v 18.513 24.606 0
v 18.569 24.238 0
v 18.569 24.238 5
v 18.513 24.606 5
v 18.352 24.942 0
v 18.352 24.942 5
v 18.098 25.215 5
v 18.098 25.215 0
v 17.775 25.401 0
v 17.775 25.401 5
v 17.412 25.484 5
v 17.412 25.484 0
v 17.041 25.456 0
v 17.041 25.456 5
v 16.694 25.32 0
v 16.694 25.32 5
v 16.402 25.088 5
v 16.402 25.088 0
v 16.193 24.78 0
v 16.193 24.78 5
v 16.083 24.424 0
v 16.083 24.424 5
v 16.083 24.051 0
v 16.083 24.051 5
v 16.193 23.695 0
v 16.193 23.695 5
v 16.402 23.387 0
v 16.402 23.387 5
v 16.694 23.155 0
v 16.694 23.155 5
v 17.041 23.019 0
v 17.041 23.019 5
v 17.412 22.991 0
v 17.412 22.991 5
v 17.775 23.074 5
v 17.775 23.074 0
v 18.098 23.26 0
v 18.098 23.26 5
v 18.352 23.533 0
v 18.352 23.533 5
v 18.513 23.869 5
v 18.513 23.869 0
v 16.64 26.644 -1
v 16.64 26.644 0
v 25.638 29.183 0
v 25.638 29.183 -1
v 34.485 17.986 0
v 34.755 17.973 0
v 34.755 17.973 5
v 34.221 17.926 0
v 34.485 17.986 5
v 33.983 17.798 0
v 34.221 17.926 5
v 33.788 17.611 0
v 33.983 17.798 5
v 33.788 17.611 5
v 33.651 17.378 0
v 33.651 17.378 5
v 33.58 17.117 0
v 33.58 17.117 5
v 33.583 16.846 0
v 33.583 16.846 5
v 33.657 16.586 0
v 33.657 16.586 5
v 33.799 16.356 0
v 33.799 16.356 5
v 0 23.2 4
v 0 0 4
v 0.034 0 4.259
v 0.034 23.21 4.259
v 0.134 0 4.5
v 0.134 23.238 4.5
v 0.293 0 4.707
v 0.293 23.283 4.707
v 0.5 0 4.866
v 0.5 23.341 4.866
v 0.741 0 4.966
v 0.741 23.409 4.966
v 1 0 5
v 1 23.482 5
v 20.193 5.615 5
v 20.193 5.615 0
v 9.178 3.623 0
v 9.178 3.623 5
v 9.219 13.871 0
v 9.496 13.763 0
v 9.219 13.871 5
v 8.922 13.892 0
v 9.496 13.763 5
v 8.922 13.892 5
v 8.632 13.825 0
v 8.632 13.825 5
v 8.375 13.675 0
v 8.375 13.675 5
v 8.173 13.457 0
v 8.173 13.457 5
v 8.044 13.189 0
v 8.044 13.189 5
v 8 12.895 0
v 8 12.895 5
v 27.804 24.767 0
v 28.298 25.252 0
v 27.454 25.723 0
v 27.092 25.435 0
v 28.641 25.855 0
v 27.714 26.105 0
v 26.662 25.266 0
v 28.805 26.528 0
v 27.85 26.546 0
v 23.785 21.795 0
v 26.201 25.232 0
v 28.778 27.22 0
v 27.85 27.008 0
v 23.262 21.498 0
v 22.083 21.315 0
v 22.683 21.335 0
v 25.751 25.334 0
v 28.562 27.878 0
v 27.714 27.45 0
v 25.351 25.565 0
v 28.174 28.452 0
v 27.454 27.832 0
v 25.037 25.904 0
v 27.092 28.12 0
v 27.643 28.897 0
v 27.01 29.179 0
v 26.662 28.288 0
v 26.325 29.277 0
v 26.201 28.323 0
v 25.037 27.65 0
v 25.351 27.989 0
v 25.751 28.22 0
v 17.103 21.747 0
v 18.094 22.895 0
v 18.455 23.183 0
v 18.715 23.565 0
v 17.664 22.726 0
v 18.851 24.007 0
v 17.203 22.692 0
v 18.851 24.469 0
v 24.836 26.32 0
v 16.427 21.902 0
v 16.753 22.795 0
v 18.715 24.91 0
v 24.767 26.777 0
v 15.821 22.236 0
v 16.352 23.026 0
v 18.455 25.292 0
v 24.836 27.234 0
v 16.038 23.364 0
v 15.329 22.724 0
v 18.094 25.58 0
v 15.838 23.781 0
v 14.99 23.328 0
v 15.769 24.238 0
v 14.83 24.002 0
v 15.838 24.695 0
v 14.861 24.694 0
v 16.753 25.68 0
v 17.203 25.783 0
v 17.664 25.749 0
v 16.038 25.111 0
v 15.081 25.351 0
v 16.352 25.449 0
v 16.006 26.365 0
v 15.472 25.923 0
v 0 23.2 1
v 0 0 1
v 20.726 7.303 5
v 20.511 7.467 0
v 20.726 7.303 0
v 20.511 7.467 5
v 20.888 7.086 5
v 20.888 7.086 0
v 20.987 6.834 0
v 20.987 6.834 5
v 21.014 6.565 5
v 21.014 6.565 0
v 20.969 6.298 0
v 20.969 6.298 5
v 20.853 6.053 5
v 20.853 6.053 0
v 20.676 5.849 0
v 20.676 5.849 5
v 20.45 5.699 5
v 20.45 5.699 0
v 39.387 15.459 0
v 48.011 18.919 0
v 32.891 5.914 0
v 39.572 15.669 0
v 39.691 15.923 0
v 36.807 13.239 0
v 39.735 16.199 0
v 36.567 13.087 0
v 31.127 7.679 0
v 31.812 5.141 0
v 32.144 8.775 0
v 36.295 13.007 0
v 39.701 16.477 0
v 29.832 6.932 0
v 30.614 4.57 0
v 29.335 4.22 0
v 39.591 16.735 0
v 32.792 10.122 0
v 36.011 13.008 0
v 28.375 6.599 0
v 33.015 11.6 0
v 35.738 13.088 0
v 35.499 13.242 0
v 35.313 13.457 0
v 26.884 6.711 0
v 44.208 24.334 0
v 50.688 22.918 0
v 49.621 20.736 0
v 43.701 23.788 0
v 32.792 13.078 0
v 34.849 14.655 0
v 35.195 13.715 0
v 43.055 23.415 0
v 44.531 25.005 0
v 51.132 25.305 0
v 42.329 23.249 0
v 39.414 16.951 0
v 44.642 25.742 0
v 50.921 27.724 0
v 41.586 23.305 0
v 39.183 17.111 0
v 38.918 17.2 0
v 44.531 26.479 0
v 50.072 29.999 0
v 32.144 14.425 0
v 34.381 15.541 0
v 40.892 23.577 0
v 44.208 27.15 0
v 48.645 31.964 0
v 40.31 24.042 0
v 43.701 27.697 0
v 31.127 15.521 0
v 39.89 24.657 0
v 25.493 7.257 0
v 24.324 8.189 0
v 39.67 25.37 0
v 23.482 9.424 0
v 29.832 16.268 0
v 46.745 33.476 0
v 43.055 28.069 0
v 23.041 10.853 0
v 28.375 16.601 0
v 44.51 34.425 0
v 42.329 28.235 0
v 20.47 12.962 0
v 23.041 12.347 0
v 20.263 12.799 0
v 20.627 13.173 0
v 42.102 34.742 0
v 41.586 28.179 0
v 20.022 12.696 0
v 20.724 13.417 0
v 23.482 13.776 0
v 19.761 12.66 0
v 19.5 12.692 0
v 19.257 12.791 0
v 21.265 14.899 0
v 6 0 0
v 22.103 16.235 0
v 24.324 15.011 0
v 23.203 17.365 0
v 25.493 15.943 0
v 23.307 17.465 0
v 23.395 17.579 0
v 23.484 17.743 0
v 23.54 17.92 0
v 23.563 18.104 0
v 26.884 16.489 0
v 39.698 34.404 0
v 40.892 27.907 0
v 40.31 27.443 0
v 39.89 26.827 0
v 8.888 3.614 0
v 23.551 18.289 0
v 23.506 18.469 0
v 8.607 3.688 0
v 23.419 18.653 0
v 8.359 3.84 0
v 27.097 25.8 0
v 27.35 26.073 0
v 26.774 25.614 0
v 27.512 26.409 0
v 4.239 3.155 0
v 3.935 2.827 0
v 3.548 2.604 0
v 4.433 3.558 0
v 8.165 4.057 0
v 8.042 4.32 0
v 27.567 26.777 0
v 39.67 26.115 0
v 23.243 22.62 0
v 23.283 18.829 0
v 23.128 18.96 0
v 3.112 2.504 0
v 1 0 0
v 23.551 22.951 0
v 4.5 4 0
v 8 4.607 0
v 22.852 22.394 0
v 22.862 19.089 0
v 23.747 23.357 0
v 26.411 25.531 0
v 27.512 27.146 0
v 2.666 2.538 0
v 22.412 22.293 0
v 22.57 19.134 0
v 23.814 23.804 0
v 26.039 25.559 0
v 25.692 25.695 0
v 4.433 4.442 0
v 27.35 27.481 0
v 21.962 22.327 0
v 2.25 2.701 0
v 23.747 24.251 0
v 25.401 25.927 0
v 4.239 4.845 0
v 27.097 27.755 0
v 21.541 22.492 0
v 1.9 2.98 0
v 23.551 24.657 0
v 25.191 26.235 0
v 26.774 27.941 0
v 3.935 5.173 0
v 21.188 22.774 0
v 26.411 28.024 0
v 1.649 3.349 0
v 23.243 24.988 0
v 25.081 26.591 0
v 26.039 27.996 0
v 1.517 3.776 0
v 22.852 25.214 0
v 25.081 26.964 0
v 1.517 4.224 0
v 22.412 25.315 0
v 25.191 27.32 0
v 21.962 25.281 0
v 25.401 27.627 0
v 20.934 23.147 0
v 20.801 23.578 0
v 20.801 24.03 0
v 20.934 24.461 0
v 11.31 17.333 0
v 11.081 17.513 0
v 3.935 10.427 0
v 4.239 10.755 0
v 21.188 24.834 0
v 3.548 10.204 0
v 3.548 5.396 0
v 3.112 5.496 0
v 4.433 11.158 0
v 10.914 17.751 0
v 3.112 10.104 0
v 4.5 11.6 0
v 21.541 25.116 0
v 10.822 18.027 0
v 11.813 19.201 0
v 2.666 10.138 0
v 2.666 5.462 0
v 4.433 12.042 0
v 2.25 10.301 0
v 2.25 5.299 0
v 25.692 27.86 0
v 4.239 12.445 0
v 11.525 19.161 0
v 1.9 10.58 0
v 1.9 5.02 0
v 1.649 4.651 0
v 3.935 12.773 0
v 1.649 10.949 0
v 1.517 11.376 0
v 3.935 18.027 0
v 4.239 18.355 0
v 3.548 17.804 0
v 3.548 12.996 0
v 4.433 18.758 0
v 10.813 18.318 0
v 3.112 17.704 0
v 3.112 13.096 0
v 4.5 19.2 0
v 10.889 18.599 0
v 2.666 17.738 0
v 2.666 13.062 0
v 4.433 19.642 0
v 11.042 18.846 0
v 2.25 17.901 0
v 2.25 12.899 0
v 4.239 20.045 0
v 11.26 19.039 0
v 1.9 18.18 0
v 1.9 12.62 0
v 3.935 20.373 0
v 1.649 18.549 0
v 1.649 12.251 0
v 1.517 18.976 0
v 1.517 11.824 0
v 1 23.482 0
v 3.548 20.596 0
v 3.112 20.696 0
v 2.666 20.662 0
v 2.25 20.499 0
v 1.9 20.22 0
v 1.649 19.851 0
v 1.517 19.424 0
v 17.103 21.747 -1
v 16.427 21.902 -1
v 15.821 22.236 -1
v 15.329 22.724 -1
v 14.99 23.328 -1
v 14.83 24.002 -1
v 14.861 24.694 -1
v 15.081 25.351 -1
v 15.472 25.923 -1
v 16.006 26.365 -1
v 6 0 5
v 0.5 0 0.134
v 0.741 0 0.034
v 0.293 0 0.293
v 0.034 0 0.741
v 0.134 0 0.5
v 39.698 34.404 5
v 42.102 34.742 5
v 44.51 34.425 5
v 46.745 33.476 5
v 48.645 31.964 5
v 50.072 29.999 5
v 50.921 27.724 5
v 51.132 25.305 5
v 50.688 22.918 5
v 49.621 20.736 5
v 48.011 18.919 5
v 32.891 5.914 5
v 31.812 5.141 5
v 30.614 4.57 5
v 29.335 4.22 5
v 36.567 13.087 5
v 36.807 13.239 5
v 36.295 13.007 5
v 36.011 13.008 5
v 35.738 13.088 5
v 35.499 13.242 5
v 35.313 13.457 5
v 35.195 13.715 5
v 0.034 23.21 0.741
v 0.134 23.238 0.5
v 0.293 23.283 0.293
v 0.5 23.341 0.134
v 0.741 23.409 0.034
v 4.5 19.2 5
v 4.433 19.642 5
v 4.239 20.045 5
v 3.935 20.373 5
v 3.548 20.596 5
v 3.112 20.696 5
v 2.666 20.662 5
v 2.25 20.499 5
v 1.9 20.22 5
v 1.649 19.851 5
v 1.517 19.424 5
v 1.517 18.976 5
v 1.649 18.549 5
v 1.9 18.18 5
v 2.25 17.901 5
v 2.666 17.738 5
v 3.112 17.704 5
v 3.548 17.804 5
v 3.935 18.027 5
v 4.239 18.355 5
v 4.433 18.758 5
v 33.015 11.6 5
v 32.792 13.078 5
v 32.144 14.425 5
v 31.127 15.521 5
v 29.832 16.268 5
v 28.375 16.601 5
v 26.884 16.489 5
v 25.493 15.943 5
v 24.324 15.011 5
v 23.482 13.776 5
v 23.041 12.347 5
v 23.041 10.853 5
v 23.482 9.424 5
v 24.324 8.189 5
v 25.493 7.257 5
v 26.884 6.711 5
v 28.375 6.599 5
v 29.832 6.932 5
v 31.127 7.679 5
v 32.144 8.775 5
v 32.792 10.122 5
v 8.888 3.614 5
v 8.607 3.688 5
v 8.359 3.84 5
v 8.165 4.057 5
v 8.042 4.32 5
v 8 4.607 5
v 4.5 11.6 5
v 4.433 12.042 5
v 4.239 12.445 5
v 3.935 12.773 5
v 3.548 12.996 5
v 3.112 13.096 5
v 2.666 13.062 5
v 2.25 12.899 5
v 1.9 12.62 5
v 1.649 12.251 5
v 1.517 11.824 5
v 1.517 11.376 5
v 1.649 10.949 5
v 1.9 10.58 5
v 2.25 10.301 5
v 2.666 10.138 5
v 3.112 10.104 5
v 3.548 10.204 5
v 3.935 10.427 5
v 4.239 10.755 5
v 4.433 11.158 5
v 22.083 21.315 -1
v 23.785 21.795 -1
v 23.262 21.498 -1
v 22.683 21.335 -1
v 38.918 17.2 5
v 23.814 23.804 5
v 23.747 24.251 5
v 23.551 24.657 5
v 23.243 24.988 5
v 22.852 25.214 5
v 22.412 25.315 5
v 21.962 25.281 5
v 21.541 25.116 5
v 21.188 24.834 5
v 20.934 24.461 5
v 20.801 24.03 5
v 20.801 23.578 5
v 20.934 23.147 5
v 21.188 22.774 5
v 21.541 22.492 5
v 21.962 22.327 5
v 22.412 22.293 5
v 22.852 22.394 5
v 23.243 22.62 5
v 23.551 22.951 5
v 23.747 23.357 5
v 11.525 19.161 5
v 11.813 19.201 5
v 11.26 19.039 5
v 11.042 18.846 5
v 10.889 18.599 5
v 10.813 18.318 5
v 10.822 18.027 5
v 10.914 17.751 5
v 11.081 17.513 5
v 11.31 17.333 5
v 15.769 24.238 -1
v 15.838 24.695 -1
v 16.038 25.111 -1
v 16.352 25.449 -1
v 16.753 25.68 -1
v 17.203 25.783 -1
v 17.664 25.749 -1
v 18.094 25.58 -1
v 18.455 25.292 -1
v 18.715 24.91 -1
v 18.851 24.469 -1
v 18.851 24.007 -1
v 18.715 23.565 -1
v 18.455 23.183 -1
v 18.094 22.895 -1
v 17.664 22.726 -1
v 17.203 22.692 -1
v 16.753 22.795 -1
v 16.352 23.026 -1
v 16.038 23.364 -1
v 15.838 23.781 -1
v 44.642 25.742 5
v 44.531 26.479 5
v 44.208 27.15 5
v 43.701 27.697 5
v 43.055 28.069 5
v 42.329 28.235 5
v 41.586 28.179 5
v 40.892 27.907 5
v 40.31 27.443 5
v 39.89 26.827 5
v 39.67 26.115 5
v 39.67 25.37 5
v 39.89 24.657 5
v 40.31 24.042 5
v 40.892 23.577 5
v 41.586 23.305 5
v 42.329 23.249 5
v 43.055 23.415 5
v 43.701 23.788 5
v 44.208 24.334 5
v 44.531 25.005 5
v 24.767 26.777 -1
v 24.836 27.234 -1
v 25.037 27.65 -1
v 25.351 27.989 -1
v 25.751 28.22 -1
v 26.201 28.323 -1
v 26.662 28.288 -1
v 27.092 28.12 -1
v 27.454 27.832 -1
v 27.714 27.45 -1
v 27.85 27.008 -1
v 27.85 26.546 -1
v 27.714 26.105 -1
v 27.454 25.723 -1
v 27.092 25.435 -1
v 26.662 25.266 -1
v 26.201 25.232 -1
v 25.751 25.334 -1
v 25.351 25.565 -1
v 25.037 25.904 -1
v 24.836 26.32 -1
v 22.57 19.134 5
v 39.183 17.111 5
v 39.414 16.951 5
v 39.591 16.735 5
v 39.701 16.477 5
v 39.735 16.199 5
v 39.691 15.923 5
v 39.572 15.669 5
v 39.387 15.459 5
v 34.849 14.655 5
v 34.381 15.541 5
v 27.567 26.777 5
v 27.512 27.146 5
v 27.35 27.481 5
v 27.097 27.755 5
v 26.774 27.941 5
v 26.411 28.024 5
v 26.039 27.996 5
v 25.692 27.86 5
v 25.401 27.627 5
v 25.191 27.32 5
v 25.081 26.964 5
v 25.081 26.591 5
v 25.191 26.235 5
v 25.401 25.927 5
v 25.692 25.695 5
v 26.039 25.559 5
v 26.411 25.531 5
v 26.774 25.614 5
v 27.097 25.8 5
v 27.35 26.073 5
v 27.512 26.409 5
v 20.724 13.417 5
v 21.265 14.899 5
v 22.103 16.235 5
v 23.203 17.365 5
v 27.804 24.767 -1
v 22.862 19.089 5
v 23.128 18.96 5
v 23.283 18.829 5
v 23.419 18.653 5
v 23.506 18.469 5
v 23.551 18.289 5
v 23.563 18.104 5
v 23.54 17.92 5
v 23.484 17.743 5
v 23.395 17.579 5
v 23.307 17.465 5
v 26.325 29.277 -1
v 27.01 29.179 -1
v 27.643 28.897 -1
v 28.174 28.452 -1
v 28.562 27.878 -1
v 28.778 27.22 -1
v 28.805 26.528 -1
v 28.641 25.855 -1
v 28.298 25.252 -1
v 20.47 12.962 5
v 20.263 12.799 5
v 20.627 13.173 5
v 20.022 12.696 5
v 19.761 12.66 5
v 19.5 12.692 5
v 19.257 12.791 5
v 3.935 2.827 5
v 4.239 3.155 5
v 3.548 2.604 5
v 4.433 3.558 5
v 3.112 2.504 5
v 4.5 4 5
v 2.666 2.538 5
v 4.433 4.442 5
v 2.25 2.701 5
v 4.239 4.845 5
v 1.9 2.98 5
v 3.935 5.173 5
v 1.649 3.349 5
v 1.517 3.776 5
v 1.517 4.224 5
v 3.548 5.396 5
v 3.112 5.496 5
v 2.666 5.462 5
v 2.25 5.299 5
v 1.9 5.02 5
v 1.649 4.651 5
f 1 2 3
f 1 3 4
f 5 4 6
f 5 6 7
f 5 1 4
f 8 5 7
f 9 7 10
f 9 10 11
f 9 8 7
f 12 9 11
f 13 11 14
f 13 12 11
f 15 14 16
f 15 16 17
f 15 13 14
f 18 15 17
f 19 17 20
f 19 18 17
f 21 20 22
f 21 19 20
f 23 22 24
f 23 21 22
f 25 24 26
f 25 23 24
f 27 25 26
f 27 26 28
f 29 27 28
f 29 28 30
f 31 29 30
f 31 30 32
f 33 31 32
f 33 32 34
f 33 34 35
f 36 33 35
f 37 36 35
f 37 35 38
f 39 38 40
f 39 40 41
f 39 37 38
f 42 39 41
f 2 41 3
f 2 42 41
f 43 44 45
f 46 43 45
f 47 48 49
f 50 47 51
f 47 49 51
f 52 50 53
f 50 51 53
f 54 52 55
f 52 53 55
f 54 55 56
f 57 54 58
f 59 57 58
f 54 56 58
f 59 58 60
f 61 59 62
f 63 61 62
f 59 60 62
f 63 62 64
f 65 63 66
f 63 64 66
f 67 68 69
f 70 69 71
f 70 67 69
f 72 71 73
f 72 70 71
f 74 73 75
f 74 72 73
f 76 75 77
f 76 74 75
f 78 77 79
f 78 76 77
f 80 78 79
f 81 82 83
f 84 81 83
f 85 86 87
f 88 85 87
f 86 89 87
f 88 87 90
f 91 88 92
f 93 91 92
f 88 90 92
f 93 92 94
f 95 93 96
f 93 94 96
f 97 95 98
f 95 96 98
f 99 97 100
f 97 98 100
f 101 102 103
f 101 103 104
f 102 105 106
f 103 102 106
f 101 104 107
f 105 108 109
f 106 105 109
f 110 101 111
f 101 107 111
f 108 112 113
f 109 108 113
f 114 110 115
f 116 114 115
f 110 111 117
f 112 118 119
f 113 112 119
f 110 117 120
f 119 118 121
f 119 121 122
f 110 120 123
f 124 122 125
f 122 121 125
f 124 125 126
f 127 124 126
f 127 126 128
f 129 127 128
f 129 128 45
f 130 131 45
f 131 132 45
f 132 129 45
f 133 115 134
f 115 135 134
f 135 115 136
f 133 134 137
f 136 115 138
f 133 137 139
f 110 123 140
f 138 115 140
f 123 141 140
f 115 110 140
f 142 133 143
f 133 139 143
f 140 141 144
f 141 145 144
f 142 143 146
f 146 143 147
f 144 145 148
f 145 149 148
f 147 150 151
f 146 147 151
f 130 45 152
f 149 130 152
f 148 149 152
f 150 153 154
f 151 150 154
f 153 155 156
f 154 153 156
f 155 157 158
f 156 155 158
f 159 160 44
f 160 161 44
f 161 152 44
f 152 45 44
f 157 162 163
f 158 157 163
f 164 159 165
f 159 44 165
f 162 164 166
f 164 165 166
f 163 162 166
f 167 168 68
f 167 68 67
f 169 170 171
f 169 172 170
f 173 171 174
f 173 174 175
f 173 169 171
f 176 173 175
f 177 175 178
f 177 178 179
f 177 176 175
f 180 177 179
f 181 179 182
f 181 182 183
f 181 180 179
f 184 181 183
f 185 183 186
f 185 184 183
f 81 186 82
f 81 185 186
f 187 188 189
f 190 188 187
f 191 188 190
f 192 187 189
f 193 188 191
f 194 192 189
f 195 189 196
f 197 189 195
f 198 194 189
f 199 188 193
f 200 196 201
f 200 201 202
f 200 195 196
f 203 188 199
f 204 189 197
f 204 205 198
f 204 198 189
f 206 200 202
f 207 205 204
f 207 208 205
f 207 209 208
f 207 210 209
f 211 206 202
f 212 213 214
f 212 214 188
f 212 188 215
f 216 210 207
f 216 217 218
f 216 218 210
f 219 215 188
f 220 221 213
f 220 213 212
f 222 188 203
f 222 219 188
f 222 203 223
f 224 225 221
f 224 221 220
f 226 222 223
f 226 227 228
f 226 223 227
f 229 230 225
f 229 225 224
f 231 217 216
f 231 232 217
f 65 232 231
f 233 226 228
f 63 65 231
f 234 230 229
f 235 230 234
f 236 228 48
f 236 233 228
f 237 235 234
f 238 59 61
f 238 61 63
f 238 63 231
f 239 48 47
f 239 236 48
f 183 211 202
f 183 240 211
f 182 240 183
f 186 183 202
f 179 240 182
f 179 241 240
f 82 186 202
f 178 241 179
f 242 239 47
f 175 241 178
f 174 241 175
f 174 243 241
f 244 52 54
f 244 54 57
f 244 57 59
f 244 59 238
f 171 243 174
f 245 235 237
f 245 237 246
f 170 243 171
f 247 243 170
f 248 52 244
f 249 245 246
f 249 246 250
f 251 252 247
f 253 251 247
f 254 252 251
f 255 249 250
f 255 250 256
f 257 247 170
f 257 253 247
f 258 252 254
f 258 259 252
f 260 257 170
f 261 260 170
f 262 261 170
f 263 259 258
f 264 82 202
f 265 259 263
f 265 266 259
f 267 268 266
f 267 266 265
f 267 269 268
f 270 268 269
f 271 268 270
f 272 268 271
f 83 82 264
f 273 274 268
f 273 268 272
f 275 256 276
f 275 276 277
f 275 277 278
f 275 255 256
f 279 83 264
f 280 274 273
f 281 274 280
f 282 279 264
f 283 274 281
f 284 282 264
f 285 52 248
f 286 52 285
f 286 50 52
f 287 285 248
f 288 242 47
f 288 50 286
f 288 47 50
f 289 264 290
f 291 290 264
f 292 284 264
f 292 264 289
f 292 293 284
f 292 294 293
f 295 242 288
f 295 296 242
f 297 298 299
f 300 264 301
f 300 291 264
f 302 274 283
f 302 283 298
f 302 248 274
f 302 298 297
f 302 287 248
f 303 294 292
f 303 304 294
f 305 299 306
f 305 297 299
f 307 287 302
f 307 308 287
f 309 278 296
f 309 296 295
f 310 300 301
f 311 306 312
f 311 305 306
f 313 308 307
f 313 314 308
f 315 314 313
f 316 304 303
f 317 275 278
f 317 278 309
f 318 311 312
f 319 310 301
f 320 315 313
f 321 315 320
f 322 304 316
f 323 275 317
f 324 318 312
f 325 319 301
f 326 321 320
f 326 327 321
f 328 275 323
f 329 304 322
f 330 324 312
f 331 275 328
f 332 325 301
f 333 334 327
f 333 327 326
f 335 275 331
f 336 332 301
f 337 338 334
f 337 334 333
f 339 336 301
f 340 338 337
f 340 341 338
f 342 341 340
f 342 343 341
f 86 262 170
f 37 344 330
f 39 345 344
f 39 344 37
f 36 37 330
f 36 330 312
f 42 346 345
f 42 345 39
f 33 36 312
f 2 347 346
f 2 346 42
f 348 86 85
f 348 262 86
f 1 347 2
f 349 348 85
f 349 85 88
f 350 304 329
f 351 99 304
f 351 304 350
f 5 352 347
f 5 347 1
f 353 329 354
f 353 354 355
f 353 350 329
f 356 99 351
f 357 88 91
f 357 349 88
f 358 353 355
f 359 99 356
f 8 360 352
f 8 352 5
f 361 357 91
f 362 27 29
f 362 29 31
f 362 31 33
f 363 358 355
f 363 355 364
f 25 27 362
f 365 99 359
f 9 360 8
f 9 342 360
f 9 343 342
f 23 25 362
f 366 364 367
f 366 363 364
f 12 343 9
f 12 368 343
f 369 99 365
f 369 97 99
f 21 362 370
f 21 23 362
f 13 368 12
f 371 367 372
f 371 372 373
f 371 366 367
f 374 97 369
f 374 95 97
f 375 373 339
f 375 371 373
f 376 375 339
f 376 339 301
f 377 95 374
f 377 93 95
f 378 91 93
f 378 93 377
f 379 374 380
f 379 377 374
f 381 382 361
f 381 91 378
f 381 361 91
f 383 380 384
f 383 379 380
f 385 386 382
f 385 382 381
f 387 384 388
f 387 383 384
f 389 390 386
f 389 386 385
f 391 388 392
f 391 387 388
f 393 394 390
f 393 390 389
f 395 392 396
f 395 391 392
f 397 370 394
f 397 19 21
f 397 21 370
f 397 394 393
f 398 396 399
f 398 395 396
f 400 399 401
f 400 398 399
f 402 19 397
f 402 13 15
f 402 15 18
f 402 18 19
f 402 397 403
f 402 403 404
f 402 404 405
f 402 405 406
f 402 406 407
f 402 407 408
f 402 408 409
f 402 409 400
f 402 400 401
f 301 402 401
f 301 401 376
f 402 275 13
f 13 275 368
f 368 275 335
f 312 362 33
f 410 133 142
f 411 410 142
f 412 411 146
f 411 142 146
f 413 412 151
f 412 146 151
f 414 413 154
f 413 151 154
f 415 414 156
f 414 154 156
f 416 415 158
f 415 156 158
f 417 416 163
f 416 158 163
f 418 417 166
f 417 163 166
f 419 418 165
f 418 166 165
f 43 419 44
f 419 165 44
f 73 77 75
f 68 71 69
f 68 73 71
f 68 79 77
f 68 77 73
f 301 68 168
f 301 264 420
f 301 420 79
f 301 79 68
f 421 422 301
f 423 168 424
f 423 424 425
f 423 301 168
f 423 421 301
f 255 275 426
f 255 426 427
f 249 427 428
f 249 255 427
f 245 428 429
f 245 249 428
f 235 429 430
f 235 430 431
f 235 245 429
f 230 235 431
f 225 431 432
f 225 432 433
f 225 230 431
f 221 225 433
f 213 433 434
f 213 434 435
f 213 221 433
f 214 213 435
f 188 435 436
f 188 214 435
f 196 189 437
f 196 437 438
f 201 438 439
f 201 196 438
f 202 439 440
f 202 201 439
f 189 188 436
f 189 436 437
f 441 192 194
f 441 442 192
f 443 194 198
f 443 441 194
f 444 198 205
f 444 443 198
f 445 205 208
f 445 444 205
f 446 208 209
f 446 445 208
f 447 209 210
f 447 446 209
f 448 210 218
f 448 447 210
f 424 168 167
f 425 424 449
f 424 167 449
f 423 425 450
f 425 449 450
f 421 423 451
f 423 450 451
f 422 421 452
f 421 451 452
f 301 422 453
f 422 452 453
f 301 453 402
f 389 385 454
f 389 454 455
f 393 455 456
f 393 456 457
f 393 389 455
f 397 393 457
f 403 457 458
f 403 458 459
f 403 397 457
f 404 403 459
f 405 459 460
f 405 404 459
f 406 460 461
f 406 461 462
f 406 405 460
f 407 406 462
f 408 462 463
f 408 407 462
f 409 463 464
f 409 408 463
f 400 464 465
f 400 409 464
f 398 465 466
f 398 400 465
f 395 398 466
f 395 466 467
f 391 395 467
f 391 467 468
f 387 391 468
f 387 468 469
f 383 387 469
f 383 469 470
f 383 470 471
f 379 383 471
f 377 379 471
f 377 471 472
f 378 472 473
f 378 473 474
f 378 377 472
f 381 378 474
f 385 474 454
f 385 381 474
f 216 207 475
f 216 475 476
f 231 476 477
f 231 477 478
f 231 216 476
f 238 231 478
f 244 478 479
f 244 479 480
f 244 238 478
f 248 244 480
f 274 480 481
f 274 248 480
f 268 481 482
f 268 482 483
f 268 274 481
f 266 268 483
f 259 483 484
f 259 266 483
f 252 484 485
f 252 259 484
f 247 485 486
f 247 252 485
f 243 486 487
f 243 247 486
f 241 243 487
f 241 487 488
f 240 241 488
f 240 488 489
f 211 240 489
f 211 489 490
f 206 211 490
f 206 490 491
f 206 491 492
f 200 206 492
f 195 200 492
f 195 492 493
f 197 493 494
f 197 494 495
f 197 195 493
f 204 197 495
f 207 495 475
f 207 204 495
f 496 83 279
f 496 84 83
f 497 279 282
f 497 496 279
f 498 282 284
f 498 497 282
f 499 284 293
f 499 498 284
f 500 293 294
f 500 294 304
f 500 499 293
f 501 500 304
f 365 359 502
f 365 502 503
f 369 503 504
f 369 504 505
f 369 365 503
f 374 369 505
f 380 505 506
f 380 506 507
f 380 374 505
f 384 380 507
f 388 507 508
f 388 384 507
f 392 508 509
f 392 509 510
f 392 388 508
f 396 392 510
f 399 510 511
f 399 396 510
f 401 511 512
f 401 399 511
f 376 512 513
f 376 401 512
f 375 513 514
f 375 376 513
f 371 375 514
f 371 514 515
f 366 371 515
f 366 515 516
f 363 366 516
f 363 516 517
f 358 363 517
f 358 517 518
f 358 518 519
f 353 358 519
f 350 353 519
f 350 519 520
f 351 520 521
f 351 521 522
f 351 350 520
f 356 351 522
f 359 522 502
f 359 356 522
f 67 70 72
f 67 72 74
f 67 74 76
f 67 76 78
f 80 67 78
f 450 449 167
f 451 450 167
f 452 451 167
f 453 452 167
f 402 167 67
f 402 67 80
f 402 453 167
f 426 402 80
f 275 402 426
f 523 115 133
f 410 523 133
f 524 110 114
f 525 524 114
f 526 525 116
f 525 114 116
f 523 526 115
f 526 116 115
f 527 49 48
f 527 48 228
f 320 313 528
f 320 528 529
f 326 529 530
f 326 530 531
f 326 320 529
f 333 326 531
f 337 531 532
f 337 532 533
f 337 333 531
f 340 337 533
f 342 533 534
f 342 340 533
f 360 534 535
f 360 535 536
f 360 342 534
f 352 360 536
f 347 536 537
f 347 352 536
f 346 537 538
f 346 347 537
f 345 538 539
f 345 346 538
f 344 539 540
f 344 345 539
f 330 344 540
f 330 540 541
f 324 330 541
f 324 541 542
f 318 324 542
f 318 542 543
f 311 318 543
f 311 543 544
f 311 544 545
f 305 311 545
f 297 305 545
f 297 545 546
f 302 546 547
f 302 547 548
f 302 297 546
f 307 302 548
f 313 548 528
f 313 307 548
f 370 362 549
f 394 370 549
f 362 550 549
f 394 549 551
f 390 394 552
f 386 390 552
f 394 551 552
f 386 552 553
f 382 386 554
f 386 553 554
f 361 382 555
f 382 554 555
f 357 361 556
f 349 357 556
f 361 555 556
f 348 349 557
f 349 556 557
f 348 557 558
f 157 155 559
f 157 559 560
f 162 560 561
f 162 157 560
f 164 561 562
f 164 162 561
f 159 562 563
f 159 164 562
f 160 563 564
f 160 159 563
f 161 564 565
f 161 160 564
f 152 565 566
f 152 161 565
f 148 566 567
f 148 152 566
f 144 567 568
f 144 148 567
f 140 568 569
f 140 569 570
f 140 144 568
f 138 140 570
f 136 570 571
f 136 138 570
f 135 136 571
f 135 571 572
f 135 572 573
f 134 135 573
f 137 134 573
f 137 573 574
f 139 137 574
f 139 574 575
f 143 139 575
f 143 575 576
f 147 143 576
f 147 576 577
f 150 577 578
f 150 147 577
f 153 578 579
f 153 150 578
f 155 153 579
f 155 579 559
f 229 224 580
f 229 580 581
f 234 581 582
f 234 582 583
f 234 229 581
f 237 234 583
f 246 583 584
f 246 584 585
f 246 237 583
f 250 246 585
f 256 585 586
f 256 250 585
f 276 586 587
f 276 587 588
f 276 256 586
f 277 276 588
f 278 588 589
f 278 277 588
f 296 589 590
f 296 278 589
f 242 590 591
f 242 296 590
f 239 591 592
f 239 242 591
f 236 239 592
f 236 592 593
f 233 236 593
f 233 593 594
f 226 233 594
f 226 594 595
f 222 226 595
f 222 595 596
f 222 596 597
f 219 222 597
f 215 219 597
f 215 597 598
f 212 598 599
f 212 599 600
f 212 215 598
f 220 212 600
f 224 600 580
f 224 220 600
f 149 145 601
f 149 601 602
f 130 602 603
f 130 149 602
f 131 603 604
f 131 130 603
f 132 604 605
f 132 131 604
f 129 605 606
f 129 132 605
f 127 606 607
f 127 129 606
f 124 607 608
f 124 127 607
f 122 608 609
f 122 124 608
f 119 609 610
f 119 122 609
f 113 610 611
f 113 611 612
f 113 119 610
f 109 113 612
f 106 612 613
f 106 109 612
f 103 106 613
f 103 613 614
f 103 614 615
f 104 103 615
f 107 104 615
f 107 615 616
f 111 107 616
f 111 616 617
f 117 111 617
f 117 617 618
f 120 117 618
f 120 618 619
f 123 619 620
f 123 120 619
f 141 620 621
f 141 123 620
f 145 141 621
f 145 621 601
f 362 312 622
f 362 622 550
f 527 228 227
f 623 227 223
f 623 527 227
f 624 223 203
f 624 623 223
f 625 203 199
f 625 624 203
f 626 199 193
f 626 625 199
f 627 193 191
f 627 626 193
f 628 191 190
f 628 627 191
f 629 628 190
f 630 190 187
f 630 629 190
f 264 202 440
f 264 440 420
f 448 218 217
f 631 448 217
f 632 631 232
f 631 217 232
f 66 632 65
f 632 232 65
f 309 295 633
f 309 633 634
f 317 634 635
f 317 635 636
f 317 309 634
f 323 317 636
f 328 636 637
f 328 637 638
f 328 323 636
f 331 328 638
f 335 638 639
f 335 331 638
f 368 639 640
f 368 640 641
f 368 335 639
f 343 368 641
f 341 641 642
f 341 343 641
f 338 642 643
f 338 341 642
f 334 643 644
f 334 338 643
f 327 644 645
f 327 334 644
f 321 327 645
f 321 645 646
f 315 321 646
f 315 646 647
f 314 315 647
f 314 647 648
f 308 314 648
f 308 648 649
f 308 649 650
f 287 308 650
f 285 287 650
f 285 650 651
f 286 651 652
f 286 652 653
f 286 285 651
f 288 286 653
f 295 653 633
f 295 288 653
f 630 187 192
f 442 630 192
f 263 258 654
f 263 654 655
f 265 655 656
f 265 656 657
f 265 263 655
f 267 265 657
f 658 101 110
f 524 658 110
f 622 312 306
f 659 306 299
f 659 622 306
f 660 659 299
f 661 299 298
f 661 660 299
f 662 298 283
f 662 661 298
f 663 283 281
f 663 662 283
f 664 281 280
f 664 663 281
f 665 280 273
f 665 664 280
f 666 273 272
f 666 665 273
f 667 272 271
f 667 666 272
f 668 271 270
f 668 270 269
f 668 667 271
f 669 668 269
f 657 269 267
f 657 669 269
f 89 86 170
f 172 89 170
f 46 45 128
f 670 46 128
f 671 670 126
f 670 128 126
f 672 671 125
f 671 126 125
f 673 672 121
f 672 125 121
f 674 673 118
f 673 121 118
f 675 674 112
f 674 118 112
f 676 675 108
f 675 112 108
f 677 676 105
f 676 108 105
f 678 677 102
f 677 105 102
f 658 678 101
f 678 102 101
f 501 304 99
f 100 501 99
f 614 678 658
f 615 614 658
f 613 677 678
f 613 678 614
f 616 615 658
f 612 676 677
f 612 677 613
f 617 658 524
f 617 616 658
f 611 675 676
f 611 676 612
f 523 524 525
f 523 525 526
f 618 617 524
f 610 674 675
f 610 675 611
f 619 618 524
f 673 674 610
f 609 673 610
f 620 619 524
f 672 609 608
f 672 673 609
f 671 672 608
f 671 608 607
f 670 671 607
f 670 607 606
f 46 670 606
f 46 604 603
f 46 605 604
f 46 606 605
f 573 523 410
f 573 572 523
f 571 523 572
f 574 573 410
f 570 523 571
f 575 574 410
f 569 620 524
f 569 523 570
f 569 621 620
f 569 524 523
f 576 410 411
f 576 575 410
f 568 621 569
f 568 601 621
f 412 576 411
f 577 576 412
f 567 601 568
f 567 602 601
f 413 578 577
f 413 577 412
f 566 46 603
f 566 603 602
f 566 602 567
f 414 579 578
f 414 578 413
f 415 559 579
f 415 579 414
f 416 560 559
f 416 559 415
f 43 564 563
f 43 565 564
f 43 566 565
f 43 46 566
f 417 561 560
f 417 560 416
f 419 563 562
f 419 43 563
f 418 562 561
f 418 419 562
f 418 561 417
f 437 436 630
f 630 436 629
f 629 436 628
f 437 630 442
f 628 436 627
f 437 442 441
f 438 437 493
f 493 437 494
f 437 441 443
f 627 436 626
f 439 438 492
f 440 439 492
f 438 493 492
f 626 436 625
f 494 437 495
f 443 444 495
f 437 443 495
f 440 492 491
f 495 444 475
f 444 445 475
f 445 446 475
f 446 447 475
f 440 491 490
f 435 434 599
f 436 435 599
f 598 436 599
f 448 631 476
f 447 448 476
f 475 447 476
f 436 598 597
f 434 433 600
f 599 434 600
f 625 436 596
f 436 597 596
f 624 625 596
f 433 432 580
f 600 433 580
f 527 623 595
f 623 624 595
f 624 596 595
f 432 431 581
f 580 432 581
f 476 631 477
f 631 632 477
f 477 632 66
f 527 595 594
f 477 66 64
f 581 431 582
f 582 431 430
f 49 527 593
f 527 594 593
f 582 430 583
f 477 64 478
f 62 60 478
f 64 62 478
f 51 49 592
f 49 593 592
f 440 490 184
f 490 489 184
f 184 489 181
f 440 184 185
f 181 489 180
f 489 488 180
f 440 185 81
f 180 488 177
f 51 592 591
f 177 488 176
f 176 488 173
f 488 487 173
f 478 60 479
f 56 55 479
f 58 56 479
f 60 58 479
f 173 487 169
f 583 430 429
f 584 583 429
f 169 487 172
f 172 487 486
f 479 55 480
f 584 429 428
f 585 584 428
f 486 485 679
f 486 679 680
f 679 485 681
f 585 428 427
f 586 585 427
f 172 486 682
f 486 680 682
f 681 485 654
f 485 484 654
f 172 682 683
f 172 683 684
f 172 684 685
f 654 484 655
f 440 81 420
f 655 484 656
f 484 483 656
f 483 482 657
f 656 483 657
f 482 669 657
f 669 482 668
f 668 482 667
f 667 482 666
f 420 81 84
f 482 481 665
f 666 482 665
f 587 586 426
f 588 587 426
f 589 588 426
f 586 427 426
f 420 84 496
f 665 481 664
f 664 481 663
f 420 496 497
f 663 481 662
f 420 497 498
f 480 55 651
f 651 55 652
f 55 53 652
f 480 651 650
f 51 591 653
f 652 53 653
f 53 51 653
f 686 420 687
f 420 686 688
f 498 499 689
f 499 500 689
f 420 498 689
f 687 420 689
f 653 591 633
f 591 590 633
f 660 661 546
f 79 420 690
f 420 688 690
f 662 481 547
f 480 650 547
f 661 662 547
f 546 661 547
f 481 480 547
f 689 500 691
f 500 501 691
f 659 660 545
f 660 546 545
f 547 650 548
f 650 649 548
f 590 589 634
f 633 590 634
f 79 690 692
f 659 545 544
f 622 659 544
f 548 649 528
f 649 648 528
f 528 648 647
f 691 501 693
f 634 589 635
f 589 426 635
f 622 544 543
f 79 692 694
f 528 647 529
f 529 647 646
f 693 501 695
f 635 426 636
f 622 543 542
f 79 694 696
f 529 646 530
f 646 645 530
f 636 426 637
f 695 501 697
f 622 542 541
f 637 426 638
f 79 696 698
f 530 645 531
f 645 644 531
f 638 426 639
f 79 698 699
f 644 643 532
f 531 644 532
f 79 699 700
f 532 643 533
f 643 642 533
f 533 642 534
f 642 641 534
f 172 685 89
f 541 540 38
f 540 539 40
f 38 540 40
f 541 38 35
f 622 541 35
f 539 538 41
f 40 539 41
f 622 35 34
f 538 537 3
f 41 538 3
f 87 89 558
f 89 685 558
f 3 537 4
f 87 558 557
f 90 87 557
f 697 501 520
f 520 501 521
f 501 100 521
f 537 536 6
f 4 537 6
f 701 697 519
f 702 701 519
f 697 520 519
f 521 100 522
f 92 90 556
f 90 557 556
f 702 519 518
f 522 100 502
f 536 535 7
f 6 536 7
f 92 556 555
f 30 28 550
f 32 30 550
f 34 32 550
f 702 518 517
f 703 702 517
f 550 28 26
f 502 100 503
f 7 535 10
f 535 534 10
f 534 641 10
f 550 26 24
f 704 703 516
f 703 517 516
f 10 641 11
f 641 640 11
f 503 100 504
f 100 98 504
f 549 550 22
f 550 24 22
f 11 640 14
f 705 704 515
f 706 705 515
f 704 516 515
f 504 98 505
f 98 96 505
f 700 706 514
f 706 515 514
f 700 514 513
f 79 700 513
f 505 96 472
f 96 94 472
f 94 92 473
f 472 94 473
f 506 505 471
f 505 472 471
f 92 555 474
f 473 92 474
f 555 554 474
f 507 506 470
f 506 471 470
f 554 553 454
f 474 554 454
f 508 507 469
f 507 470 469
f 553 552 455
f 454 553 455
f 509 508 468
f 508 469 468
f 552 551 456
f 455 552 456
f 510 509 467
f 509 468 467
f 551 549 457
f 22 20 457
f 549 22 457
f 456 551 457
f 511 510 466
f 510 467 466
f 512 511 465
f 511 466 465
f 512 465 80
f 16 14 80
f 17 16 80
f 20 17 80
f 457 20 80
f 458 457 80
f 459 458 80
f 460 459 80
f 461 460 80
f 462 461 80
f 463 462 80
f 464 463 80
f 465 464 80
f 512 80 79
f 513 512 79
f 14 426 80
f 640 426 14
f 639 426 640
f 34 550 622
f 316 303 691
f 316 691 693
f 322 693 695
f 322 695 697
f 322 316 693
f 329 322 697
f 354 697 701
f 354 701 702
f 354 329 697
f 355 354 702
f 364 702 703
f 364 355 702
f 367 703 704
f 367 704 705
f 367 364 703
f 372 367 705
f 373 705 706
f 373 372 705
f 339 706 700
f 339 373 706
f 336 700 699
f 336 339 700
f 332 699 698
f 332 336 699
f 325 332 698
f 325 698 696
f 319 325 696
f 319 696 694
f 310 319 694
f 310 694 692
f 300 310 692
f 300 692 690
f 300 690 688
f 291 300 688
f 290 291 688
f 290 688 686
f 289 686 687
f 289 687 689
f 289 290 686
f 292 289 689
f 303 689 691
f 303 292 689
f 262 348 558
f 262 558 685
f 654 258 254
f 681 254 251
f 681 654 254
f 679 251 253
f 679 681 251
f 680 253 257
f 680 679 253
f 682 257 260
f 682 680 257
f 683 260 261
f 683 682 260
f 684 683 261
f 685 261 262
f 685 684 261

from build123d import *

# Parameters (mm, degrees)
SKETCH_1_R          = 1.5
SKETCH_1_R_2        = 5.015
SKETCH_1_R_3        = 2.5
SKETCH_1_R_4        = 1.515
SKETCH_1_R_5        = 1.25
EXTRUDE_1_DEPTH     = 5
FILLET_1_R          = 1
CUT_EXTRUDE_START   = -10
CUT_EXTRUDE_1_DEPTH = 10
FILLET_2_R          = 1
SKETCH_4_R          = 1.55
EXTRUDE_2_DEPTH     = 1


with BuildPart() as part:
    # 草图1 → 凸台-拉伸1 (new body)
    with BuildSketch(Plane.XY):
        with BuildLine():
            Line((0, 0), (0, 23.2))
            Line((0, 23.2), (39.697573244, 34.403781817))
            ThreePointArc((39.697573244, 34.403781817), (50.071662903, 29.999200004), (48.010875696, 18.918801397))
            Line((48.010875696, 18.918801397), (32.890616727, 5.913888145))
            ThreePointArc((32.890616727, 5.913888145), (31.225823282, 4.829175519), (29.3346121, 4.219701189))
            Line((29.3346121, 4.219701189), (6, 0))
            Line((6, 0), (0, 0))
        make_face()
        with Locations((3, 19.2)):
            Circle(SKETCH_1_R, mode=Mode.SUBTRACT)
        with Locations((3, 11.6)):
            Circle(SKETCH_1_R, mode=Mode.SUBTRACT)
        with Locations((3, 4)):
            Circle(SKETCH_1_R, mode=Mode.SUBTRACT)
        with Locations((28, 11.6)):
            Circle(SKETCH_1_R_2, mode=Mode.SUBTRACT)
        with Locations((42.142135624, 25.742135624)):
            Circle(SKETCH_1_R_3, mode=Mode.SUBTRACT)
        with Locations((22.298810634, 23.803988685)):
            Circle(SKETCH_1_R_4, mode=Mode.SUBTRACT)
        with Locations((17.318802705, 24.237631422)):
            Circle(SKETCH_1_R_5, mode=Mode.SUBTRACT)
        with Locations((26.317290694, 26.777260117)):
            Circle(SKETCH_1_R_5, mode=Mode.SUBTRACT)
    extrude(amount=EXTRUDE_1_DEPTH)

    # 圆角1
    fillet_1_edges = [part.edges().sort_by_distance(p)[0] for p in [
        (0, 11.6, 0),
        (0, 11.6, 5),
    ]]
    fillet(fillet_1_edges, radius=FILLET_1_R)

    # 草图3 → 切除-拉伸1 (cut)
    with BuildSketch(Plane.XY.offset(5).offset(CUT_EXTRUDE_START)):
        with BuildLine():
            Line((35.48325952, 12.100826268), (40.96881595, 16.818945558))
            Line((40.96881595, 16.818945558), (29.369933326, 18.973824156))
            ThreePointArc((29.369933326, 18.973824156), (33.603952256, 16.584548035), (35.48325952, 12.100826268))
        make_face()
        Polygon((8, 14.618103259), (8, 3.410325902), (22.896528211, 6.104131033), align=None)
        with BuildLine():
            Line((28.046942827, 19.09985309), (8, 19.225330237))
            Line((8, 19.225330237), (20.514901979, 12.072554345))
            ThreePointArc((20.514901979, 12.072554345), (22.883627253, 17.083860858), (28.046942827, 19.09985309))
        make_face()
    extrude(amount=CUT_EXTRUDE_1_DEPTH, mode=Mode.SUBTRACT)

    # 圆角2
    fillet_2_edges = [part.edges().sort_by_distance(p)[0] for p in [
        (22.896528211, 6.104131033, 2.5),
        (8, 3.410325902, 2.5),
        (29.369933326, 18.973824156, 2.5),
        (40.96881595, 16.818945558, 2.5),
        (35.48325952, 12.100826268, 2.5),
        (8, 14.618103259, 2.5),
        (20.514901979, 12.072554345, 2.5),
        (8, 19.225330237, 2.5),
    ]]
    fillet(fillet_2_edges, radius=FILLET_2_R)
    fillet_2_2_edges = [part.edges().sort_by_distance(p)[0] for p in [
        (28.046942827, 19.09985309, 2.5),
    ]]
    fillet(fillet_2_2_edges, radius=FILLET_2_R)


with BuildPart() as body_2:
    # 草图4 → 凸台-拉伸2 (new body)
    with BuildSketch(Plane(origin=(0, 0, 0), x_dir=(-1, 0, 0), z_dir=(0, 0, -1))):
        with BuildLine():
            Line((-27.803806286, 24.767217481), (-23.784643837, 21.794868765))
            ThreePointArc((-23.784643837, 21.794868765), (-22.977544022, 21.39908034), (-22.08261057, 21.314506672))
            Line((-22.08261057, 21.314506672), (-17.102503348, 21.747006081))
            ThreePointArc((-17.102503348, 21.747006081), (-14.829891944, 24.002422523), (-16.639757599, 26.643644253))
            Line((-16.639757599, 26.643644253), (-25.638245589, 29.183272948))
            ThreePointArc((-25.638245589, 29.183272948), (-28.561926214, 27.877992319), (-27.803806286, 24.767217481))
        make_face()
        with Locations((-26.317290694, 26.777260117)):
            Circle(SKETCH_4_R, mode=Mode.SUBTRACT)
        with Locations((-17.318802705, 24.237631422)):
            Circle(SKETCH_4_R, mode=Mode.SUBTRACT)
    extrude(amount=EXTRUDE_2_DEPTH)


solid = Compound([part.part, body_2.part])
